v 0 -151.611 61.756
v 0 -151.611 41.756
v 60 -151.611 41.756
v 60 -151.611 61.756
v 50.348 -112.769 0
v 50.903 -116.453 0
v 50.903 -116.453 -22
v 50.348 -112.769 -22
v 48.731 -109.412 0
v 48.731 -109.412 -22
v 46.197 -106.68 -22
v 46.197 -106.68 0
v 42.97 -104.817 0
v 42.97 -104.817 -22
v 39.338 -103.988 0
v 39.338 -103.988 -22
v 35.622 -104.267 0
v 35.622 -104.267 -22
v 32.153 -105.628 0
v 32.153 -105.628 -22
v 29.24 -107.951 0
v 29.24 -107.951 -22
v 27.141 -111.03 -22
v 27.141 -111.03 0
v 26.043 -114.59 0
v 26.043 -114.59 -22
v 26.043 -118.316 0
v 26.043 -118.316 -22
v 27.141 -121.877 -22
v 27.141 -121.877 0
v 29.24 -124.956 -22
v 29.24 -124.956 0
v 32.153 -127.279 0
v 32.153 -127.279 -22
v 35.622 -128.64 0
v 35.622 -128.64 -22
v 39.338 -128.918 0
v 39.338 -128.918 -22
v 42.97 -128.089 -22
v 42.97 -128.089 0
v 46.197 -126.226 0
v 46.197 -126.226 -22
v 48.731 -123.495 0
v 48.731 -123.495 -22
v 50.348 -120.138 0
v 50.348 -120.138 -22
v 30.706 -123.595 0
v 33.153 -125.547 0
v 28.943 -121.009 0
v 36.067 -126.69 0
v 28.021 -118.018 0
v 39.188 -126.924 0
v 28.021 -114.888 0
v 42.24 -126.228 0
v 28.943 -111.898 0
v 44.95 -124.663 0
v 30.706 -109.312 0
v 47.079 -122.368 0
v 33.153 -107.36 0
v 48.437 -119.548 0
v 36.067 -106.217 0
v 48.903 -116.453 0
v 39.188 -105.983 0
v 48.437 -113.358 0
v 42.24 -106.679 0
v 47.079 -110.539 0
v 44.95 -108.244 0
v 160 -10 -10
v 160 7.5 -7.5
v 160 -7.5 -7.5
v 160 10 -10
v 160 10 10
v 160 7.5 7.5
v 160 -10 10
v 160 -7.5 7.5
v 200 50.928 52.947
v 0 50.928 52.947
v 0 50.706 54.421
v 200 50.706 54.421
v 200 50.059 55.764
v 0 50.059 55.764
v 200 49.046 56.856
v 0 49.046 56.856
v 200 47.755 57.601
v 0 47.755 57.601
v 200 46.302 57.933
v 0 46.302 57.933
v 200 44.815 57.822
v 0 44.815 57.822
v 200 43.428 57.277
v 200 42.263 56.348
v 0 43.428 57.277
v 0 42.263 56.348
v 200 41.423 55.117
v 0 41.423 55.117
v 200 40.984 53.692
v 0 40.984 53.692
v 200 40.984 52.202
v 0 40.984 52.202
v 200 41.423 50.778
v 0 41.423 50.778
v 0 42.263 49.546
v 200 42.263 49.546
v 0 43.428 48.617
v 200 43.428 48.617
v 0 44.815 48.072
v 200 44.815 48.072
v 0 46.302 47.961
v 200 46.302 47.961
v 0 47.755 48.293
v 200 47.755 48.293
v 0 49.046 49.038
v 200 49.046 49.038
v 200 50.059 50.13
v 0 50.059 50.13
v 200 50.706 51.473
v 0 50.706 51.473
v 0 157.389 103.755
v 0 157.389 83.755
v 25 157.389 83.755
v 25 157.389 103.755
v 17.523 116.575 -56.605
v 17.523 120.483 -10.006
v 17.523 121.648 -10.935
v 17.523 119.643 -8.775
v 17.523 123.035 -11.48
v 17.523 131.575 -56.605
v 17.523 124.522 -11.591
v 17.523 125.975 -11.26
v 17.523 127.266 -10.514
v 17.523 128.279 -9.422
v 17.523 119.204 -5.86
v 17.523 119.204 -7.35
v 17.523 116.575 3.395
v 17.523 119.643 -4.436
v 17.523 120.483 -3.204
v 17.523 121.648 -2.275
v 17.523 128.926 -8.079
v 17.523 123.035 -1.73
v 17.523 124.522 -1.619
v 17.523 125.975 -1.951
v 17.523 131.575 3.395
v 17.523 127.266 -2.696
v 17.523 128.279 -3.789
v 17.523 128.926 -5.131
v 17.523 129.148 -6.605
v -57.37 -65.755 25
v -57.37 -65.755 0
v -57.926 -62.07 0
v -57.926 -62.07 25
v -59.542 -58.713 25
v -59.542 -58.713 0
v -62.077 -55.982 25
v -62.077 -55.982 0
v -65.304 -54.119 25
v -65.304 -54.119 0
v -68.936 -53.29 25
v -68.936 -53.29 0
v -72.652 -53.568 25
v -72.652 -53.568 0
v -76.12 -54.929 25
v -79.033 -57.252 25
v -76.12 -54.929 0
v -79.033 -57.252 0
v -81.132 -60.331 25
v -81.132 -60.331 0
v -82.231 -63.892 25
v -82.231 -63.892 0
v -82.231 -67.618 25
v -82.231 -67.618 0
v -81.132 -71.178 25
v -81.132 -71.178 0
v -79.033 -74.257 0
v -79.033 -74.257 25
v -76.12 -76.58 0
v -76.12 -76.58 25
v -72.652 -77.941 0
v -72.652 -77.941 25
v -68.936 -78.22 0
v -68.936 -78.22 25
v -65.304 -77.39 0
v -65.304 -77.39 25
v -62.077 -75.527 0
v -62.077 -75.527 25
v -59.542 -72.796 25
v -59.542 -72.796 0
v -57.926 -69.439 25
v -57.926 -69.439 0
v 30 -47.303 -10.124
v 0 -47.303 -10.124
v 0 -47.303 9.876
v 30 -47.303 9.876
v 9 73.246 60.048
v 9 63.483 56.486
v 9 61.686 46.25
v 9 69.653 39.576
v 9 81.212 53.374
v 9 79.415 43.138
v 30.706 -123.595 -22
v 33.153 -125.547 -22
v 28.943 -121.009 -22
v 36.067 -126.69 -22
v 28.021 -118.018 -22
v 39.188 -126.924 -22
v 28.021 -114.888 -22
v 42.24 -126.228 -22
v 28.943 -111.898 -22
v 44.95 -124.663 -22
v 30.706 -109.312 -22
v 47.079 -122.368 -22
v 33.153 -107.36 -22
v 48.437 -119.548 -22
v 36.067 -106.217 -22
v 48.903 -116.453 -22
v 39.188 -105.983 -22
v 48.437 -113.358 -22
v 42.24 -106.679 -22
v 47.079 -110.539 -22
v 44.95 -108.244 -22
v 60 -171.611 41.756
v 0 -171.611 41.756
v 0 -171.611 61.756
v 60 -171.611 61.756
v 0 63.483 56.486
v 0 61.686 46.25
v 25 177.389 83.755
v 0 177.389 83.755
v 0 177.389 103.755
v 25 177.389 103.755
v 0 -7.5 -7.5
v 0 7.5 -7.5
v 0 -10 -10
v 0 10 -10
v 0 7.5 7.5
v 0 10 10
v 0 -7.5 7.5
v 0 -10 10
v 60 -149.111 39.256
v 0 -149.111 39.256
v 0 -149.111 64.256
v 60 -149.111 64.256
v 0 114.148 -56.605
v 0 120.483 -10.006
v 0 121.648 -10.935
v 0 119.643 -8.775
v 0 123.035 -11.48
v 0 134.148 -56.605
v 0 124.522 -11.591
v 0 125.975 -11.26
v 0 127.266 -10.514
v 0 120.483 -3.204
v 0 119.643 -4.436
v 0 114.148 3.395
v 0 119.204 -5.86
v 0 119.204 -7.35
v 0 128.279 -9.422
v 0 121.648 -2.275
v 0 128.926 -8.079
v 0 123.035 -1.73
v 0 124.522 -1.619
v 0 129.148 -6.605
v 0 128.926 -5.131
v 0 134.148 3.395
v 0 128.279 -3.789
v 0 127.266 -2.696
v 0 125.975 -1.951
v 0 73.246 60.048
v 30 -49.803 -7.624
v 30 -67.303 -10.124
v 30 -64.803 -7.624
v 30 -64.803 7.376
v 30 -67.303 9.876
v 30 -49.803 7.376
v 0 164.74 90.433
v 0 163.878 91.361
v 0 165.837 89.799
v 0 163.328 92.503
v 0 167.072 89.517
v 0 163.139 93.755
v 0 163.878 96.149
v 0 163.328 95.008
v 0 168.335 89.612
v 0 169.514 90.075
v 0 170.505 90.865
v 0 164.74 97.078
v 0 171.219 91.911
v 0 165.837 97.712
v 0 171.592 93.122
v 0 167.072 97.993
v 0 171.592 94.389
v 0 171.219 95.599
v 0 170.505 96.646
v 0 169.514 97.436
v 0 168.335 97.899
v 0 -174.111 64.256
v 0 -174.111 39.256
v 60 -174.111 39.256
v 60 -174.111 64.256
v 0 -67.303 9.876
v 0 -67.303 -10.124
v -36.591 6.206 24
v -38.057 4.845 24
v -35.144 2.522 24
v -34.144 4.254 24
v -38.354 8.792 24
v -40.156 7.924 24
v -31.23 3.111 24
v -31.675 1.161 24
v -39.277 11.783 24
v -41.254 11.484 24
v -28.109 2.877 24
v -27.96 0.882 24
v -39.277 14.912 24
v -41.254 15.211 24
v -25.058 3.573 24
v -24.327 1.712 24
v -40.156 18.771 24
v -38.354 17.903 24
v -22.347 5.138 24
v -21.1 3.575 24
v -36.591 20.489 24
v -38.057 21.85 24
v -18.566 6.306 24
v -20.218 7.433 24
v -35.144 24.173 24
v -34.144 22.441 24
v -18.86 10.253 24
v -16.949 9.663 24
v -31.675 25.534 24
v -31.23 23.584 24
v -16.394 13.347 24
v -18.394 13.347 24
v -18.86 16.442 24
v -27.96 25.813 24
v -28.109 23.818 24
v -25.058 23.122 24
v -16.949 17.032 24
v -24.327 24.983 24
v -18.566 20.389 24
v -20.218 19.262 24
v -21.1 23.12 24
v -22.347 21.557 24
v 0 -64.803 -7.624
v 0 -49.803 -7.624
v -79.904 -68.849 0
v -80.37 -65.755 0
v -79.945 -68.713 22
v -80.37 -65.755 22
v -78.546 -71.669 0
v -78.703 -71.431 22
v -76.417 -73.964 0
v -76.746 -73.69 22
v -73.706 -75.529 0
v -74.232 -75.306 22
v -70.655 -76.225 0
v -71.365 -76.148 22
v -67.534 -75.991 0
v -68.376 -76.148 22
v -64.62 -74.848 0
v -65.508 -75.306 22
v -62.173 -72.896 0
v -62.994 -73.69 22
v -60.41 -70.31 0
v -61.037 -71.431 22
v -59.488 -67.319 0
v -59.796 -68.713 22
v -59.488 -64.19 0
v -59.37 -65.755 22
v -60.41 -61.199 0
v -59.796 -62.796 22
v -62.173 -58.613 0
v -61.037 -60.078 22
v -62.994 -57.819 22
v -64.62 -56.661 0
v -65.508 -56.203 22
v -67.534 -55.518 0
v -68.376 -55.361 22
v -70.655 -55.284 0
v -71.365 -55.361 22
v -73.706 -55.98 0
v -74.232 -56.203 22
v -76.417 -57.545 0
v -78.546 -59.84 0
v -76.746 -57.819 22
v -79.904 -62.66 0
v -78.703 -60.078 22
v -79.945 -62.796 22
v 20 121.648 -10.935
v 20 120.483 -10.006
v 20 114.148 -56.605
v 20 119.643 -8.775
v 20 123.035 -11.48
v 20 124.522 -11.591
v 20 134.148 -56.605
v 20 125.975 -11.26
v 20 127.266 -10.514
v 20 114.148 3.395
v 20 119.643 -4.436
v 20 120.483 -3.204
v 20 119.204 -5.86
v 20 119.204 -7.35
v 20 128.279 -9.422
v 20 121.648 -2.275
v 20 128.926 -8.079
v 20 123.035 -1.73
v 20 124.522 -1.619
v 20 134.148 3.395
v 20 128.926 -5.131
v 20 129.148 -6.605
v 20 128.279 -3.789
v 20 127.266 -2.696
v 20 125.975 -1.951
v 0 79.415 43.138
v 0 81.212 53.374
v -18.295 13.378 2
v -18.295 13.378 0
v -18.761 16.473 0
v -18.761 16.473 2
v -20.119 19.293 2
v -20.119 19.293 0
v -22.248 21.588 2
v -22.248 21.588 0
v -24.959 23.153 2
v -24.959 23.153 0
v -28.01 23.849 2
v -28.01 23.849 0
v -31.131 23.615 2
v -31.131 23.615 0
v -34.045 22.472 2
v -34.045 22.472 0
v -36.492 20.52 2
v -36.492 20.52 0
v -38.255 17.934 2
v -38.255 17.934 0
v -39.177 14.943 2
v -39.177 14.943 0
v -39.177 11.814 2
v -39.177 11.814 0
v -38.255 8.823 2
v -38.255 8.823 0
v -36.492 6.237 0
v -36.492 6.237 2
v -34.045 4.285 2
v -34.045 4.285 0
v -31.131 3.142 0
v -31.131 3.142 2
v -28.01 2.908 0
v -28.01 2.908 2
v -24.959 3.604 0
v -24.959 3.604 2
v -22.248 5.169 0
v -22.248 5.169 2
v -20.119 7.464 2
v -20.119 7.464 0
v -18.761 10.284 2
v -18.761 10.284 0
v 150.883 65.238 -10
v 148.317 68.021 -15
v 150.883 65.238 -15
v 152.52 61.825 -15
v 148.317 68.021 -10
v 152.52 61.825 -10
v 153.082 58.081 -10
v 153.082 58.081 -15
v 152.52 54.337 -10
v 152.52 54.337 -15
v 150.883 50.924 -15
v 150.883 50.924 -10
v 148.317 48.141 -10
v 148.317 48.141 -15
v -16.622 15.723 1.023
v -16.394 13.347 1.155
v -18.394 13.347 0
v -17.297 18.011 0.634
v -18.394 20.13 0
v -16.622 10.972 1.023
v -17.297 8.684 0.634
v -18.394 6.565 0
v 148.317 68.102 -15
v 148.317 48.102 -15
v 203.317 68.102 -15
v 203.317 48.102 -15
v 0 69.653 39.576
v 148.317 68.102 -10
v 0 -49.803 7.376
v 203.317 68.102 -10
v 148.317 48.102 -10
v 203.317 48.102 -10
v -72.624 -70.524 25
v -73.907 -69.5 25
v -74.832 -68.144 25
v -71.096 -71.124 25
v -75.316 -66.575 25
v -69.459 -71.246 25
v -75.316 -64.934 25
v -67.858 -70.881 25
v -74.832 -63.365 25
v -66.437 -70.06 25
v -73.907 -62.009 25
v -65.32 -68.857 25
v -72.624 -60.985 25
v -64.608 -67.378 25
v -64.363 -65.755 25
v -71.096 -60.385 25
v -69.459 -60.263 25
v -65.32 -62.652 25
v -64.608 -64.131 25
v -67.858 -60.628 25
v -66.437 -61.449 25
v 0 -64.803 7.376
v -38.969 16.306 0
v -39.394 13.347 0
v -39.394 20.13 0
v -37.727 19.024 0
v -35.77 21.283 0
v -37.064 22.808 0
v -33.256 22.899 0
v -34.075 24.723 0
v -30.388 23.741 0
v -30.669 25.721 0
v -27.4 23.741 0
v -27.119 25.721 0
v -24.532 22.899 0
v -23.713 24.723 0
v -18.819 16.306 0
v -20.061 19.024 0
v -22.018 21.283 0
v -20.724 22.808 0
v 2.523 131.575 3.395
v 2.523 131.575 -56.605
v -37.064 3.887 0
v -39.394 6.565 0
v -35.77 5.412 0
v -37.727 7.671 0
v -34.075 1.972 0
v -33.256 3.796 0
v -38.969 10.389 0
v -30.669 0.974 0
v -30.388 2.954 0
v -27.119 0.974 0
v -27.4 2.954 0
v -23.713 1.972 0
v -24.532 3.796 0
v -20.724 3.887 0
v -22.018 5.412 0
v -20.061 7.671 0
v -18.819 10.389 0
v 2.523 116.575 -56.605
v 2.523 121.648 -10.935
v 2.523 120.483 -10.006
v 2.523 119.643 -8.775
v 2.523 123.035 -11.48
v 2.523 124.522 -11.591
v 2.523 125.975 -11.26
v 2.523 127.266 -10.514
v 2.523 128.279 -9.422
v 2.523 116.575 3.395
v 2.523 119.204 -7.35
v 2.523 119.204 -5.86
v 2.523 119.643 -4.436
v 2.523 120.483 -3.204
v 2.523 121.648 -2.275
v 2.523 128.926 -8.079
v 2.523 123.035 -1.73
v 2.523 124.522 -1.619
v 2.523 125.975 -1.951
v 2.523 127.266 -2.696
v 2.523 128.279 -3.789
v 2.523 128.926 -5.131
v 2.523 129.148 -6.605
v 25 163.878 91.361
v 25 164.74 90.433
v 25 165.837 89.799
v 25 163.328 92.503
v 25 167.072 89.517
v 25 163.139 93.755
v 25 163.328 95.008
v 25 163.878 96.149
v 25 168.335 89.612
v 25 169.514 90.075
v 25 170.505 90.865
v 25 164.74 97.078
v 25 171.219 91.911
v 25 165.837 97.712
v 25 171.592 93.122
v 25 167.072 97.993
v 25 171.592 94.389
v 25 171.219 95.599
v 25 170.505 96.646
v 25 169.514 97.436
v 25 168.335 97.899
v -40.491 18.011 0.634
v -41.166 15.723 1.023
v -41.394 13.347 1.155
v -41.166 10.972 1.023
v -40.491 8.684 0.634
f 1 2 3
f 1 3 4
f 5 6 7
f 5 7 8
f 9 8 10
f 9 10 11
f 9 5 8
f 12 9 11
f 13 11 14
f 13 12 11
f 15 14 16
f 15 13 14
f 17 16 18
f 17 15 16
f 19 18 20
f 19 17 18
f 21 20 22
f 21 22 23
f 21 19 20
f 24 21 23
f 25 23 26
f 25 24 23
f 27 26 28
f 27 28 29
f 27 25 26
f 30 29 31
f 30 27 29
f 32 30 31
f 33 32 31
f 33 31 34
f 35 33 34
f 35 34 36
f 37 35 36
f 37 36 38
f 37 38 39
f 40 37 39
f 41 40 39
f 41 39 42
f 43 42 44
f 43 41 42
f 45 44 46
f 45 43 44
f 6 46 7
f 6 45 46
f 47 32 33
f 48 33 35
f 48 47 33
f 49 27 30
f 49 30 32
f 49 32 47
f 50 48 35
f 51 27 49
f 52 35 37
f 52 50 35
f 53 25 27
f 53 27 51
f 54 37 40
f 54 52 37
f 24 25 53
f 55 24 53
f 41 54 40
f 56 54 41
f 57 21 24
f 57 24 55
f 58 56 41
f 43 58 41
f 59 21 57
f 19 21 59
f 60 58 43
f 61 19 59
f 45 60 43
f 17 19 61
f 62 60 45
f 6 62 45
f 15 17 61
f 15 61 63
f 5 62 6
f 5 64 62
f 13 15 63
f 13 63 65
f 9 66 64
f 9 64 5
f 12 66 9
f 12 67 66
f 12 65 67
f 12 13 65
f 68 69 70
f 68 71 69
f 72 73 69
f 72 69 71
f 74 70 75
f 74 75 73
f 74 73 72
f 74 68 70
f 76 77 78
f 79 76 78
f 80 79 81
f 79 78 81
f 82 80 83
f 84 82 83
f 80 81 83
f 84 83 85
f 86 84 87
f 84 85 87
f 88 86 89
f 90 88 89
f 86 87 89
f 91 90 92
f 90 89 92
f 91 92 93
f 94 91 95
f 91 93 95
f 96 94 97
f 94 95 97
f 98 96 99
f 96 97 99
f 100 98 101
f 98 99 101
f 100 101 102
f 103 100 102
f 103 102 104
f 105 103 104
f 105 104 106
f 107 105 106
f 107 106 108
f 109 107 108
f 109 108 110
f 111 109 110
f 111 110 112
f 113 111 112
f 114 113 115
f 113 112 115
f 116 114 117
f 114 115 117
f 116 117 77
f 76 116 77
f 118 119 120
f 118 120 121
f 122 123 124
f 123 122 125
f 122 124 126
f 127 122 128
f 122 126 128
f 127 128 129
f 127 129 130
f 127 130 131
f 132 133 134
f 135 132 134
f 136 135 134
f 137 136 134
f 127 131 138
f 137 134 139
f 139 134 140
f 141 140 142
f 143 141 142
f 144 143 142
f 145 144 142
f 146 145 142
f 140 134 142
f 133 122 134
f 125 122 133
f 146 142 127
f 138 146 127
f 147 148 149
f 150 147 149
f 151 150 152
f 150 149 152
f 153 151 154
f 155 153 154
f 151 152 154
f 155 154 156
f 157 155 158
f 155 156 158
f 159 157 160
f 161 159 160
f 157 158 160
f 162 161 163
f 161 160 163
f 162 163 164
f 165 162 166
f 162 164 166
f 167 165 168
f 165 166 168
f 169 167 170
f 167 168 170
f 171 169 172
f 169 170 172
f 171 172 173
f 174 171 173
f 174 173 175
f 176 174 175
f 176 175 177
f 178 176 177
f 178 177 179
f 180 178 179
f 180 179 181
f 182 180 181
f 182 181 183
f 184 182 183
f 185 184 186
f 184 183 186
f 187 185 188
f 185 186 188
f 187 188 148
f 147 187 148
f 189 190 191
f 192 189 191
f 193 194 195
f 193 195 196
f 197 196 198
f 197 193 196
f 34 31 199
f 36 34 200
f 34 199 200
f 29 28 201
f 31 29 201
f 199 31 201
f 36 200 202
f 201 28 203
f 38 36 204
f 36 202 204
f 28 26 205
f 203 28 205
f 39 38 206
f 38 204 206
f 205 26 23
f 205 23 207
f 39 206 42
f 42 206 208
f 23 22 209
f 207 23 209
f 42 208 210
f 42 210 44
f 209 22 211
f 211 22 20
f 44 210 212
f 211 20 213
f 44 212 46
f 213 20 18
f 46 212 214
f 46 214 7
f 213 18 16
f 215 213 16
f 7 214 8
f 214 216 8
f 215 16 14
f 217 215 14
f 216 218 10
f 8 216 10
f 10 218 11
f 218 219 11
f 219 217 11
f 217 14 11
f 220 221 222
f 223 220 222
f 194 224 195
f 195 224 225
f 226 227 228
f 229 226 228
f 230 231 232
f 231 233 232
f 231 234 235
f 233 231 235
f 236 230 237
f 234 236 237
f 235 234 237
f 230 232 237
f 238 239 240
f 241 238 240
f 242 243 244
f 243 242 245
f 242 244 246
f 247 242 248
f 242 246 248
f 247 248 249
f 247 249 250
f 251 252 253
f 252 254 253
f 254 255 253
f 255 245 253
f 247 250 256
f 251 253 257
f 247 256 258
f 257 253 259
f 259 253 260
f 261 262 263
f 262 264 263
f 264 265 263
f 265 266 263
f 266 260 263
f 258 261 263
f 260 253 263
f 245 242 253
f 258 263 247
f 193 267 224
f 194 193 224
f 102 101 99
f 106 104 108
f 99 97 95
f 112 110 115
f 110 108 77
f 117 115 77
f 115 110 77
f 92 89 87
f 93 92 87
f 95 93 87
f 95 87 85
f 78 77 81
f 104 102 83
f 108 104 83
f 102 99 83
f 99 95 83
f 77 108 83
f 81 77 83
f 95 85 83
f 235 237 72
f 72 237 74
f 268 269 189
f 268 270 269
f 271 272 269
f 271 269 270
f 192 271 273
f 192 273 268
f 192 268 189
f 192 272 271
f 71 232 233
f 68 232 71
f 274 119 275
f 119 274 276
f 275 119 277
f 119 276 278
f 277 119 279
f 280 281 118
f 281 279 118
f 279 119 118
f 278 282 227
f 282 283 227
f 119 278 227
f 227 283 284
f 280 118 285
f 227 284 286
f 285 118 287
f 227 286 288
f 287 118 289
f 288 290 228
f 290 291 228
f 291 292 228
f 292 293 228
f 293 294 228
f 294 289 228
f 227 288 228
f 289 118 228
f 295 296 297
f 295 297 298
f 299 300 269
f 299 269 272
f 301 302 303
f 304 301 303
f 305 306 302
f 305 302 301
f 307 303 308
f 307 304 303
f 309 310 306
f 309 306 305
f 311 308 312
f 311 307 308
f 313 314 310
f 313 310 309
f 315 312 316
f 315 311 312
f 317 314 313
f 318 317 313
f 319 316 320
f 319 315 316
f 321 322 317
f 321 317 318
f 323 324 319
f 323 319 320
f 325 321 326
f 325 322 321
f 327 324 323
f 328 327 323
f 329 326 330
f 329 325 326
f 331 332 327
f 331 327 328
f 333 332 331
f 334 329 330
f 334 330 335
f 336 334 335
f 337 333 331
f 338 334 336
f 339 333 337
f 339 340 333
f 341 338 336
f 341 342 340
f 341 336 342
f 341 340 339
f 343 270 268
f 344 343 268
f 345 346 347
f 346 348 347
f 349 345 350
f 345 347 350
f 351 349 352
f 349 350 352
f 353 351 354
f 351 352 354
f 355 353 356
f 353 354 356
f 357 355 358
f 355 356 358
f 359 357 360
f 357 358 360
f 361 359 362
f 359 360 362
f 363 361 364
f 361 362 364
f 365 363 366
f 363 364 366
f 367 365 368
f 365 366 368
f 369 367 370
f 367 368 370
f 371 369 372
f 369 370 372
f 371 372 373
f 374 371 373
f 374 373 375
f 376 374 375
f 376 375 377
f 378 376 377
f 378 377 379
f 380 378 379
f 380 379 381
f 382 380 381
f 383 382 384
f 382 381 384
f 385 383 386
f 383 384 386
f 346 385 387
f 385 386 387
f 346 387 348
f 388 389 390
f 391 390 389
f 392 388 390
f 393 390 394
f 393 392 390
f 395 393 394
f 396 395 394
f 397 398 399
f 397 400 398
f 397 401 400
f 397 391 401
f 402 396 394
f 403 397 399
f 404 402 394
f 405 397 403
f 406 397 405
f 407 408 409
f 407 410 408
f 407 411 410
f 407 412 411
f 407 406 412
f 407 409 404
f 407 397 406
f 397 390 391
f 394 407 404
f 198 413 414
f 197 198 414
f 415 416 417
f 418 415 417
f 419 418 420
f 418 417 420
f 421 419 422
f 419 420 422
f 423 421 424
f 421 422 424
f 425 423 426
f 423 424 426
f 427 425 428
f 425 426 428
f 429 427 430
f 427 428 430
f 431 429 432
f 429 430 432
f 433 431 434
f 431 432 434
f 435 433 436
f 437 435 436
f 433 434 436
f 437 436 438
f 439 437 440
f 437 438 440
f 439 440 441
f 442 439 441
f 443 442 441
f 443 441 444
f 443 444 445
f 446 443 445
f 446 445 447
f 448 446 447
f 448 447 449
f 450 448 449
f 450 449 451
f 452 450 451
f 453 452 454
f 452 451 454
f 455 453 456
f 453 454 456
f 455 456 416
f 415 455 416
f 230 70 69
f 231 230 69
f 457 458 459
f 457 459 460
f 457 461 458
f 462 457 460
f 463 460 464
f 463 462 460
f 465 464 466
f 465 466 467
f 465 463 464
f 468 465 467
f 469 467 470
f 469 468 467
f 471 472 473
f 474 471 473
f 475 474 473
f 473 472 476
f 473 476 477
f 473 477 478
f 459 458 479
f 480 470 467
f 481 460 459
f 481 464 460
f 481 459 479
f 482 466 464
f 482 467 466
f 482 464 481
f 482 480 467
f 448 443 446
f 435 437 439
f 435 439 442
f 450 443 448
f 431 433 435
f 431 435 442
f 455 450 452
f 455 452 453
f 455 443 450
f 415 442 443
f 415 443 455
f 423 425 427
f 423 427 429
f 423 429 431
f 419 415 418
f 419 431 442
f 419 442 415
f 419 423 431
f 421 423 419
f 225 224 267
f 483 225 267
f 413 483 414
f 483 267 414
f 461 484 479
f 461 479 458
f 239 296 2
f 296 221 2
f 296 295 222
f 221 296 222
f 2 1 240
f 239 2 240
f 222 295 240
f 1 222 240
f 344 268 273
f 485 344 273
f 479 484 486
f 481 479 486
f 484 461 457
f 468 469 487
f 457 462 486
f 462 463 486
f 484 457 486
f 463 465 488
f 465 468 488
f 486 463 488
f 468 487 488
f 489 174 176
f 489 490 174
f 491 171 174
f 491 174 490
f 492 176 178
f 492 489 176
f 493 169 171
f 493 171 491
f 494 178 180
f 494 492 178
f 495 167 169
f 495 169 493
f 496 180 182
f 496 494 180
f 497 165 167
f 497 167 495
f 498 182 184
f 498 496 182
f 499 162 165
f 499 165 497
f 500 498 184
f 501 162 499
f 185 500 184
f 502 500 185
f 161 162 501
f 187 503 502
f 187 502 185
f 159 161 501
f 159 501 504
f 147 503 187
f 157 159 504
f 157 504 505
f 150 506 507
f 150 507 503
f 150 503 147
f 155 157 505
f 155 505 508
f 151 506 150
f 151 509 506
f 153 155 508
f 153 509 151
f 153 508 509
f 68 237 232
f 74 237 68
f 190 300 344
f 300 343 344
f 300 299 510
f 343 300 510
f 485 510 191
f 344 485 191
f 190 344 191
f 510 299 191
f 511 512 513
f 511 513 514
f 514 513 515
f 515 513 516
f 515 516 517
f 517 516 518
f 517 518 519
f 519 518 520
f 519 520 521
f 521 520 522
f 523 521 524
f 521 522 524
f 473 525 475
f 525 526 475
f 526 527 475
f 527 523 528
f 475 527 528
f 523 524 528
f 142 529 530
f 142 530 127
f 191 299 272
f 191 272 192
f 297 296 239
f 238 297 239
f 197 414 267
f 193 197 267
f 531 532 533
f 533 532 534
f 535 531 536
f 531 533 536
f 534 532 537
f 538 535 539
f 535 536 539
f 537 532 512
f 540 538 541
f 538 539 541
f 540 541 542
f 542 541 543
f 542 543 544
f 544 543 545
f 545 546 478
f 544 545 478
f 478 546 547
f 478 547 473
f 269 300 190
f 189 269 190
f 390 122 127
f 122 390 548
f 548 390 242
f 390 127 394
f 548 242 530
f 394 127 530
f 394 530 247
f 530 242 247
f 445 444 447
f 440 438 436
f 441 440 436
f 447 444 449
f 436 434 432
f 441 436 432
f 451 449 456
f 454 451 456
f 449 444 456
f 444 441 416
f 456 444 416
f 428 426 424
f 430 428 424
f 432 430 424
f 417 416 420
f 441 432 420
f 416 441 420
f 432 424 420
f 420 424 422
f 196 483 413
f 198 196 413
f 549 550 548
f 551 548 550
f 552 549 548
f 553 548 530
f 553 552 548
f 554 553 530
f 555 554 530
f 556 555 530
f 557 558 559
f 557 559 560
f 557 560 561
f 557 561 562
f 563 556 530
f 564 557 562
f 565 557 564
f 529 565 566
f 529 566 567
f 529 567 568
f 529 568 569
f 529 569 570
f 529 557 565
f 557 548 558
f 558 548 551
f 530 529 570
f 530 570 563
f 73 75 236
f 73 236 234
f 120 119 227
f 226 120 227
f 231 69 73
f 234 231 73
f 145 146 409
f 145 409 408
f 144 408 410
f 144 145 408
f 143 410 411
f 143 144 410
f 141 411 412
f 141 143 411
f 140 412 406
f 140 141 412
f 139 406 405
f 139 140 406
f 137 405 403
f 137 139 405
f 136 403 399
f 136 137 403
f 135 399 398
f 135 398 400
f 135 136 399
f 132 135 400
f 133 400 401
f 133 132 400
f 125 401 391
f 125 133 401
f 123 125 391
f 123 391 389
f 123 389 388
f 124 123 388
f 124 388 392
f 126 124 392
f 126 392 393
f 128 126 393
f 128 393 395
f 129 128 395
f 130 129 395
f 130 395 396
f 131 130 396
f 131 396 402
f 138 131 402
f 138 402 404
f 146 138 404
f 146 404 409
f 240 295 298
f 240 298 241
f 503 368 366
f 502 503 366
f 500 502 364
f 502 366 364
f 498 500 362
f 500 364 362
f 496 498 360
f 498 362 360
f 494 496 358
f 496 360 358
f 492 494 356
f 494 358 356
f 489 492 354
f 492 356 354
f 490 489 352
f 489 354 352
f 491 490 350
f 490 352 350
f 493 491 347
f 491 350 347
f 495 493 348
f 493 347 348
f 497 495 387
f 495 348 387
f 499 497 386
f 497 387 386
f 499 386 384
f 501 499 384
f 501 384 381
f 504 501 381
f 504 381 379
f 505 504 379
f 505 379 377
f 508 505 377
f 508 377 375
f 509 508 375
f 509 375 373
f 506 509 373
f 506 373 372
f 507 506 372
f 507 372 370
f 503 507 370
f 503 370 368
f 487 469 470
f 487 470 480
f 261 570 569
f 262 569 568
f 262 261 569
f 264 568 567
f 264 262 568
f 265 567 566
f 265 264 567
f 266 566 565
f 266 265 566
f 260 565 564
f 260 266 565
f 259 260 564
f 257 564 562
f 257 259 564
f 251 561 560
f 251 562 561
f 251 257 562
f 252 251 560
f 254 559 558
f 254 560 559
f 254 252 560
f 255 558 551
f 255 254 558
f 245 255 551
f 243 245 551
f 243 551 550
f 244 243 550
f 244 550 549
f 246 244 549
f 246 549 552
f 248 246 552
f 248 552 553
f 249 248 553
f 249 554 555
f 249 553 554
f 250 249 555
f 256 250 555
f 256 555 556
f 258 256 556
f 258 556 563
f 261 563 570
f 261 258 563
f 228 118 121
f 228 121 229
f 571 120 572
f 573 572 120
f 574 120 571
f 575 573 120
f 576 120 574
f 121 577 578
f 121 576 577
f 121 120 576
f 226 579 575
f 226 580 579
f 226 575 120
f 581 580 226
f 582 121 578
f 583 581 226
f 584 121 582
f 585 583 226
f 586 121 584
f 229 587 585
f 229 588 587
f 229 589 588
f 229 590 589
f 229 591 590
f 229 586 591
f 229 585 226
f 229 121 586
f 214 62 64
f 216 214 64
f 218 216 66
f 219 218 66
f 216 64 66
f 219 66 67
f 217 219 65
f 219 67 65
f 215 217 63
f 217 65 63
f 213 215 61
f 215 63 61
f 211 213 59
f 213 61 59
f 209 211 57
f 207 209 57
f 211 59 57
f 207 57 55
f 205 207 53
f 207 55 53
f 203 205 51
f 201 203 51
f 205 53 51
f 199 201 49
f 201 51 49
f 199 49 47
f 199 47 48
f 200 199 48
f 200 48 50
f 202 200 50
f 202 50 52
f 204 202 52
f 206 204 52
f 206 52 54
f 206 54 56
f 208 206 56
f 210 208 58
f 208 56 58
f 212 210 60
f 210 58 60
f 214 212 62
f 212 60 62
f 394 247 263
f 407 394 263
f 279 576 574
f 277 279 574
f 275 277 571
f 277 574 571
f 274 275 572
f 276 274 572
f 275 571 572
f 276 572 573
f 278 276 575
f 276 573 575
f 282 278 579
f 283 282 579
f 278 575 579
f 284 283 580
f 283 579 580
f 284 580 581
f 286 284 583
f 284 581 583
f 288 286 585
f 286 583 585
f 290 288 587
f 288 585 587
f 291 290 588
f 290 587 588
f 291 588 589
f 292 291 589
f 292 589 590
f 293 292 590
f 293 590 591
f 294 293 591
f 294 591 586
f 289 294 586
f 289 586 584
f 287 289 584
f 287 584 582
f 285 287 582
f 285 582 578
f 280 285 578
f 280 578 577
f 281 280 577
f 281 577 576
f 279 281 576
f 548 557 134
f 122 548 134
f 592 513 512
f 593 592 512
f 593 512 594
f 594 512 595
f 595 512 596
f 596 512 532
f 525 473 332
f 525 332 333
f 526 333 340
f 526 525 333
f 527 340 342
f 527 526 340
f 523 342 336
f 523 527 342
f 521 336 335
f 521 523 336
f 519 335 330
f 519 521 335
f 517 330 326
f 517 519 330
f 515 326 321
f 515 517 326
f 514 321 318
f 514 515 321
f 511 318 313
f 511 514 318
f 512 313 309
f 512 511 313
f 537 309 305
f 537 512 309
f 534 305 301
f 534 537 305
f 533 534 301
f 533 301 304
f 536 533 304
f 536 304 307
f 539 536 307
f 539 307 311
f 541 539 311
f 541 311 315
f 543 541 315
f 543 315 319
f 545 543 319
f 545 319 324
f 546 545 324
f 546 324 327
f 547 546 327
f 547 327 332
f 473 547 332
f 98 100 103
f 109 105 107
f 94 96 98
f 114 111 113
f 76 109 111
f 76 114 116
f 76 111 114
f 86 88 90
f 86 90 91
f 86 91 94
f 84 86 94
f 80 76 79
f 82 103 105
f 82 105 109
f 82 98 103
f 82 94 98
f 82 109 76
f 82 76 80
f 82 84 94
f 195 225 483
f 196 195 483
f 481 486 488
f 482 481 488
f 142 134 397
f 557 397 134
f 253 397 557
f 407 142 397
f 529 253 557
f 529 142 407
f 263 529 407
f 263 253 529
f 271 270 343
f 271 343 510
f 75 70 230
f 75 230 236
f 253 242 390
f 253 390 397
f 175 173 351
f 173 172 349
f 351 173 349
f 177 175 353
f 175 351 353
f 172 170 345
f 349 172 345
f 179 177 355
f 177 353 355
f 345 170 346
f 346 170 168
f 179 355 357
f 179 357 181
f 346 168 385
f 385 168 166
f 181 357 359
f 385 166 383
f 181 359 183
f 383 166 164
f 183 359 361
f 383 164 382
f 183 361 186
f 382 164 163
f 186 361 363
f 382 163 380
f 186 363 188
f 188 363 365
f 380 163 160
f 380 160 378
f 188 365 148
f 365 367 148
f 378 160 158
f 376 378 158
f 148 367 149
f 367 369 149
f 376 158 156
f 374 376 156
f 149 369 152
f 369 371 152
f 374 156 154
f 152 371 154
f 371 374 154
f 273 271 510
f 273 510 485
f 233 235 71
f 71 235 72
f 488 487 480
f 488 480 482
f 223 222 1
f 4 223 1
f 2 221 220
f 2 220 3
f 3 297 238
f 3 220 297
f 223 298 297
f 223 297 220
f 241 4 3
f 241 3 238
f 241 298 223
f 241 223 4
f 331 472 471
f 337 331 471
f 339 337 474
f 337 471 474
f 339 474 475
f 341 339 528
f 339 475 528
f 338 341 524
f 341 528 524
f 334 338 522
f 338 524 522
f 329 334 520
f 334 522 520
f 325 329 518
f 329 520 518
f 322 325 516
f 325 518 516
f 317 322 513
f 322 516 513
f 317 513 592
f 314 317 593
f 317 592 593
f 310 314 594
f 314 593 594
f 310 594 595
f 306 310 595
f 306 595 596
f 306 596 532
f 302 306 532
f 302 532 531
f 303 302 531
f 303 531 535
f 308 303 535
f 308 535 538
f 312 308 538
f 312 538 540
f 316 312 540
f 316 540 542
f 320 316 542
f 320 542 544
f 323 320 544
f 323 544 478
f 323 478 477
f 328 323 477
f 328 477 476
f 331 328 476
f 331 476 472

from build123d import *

# Parameters (mm, degrees)
F0_W      = 160
F0_H      = 20
F1_DEPTH  = 10
F2_W      = 25
F2_H      = 25
F2_W_2    = 20
F2_H_2    = 20
F3_DEPTH  = 60
F4_W      = 15
F4_H      = 15
F5_DEPTH  = 160
F6_W      = 20
F6_H      = 20
F6_W_2    = 15
F6_H_2    = 15
F7_DEPTH  = 30
F8_R      = 12.5
F8_R_2    = 10.5
F9_DEPTH  = 22
F10_R     = 12.5
F10_R_2   = 10.5
F11_DEPTH = 24
F12_R     = 12.5
F13_DEPTH = 25
F14_D     = 21
F14_DEPTH = 22
F14_TIP   = 6.3090364998
F15_W     = 55
F15_H     = 20
F16_DEPTH = 5
F17_W     = 20
F17_H     = 60
F17_R     = 5
F18_DEPTH = 20
F19_W     = 20
F19_H     = 20
F20_DEPTH = 25
F21_D     = 8.5
F22_R     = 5
F23_DEPTH = 200
F25_DEPTH = 9
F27_DEPTH = 25
F29_DEPTH = 25
F30_R     = 10.5
F31_DEPTH = 2
F32_W     = 15
F32_H     = 15
F33_DEPTH = 60
F34_R     = 12.75
F35_DEPTH = 5


# Not quite as in the source:
# - a feature names something its author has since deleted; it is built from what else it names


with BuildPart() as f1:
    # F0 (on Front) → F1 (new body, symmetric)
    with BuildSketch(Plane.XZ):
        with Locations((80, 0)):
            Rectangle(F0_W, F0_H)
    extrude(amount=F1_DEPTH, both=True)

    # F4 (on Right) → F5 (cut)
    with BuildSketch(Plane.YZ):
        Rectangle(F4_W, F4_H)
    extrude(amount=F5_DEPTH, mode=Mode.SUBTRACT)


with BuildPart() as f3:
    # F2 (on Right) → F3 (new body)
    with BuildSketch(Plane.YZ):
        with Locations((-161.6110950708, 51.756149815)):
            Rectangle(F2_W, F2_H)
        with Locations((-161.6110950708, 51.756149815)):
            Rectangle(F2_W_2, F2_H_2, mode=Mode.SUBTRACT)
    extrude(amount=F3_DEPTH)


with BuildPart() as f7:
    # F6 (on Right) → F7 (new body)
    with BuildSketch(Plane.YZ):
        with Locations((-57.3030114174, -0.1235169003)):
            Rectangle(F6_W, F6_H)
        with Locations((-57.3030114174, -0.1235169003)):
            Rectangle(F6_W_2, F6_H_2, mode=Mode.SUBTRACT)
    extrude(amount=F7_DEPTH)


with BuildPart() as f9:
    # F8 (on Top) → F9 (new body)
    with BuildSketch(Plane.XY):
        with Locations((38.4034886956, -116.4533868432)):
            Circle(F8_R)
        with Locations((38.4034886956, -116.4533868432)):
            Circle(F8_R_2, mode=Mode.SUBTRACT)
    extrude(amount=-F9_DEPTH)


with BuildPart() as f11:
    # F10 (on Top) → F11 (new body)
    with BuildSketch(Plane.XY):
        with Locations((-28.8939643651, 13.3474841714)):
            Circle(F10_R)
        with Locations((-28.8939643651, 13.3474841714)):
            Circle(F10_R_2, mode=Mode.SUBTRACT)
    extrude(amount=F11_DEPTH)

    # F26 (on Front) → F27 (cut)
    with BuildSketch(Plane.XZ):
        Polygon((-18.3939643651, 0), (-16.3939643651, 0), (-16.3939643651, 1.1547005384), align=None)
    extrude(amount=-F27_DEPTH, mode=Mode.SUBTRACT)

    # F28 (on Front) → F29 (cut)
    with BuildSketch(Plane.XZ):
        Polygon((-41.3939643651, 1.1547005384), (-41.3939643651, 0), (-39.3939643651, 0), align=None)
    extrude(amount=-F29_DEPTH, mode=Mode.SUBTRACT)


with BuildPart() as f13:
    # F12 (on Top) → F13 (new body)
    with BuildSketch(Plane.XY):
        with Locations((-69.8703065715, -65.7545542214)):
            Circle(F12_R)
    extrude(amount=F13_DEPTH)

    # F14
    with Locations(Plane(origin=(0, 0, 0), x_dir=(1, 0, 0), z_dir=(0, 0, -1))):
        with Locations((-69.8703065715, 65.7545542214)):
            Hole(F14_D / 2, depth=F14_DEPTH)
            with Locations((0, 0, -(F14_DEPTH + F14_TIP / 2))):  # 118° drill point
                Cone(0, F14_D / 2, F14_TIP, mode=Mode.SUBTRACT)


with BuildPart() as f16:
    # F15 (on face) → F16 (new body)
    with BuildSketch(Plane(origin=(0, 0, -10), x_dir=(1, 0, 0), z_dir=(0, 0, -1))):
        with Locations((175.8168041706, -58.102128388)):
            Rectangle(F15_W, F15_H)
    extrude(amount=F16_DEPTH)

    # F34 (on face) → F35 (cut)
    with BuildSketch(Plane(origin=(0, 0, -10), x_dir=(1, 0, 0), z_dir=(0, 0, -1))):
        with Locations((140.3318259962, -58.0808729371)):
            Circle(F34_R)
    extrude(amount=F35_DEPTH, mode=Mode.SUBTRACT)


with BuildPart() as f18:
    # F17 (on Right) → F18 (new body)
    with BuildSketch(Plane.YZ):
        with Locations((124.1480589582, -26.6051380336)):
            Rectangle(F17_W, F17_H)
        with Locations((124.1480589582, -6.6051380336)):
            Circle(F17_R, mode=Mode.SUBTRACT)
    extrude(amount=F18_DEPTH)

    # F32 (on face) → F33 (cut)
    with BuildSketch(Plane.XY.offset(3.3948619664)):
        with Locations((10.0230817938, 124.0749582648)):
            Rectangle(F32_W, F32_H)
    extrude(amount=-F33_DEPTH, mode=Mode.SUBTRACT)


with BuildPart() as f20:
    # F19 (on Right) → F20 (new body)
    with BuildSketch(Plane.YZ):
        with Locations((167.3894077539, 93.7553744961)):
            Rectangle(F19_W, F19_H)
    extrude(amount=F20_DEPTH)

    # F21 (through all)
    with Locations(Plane(origin=(0, 0, 0), x_dir=(0, 1, 0), z_dir=(-1, 0, 0))):
        with Locations((167.3894077539, -93.7553744961)):
            Hole(F21_D / 2)


with BuildPart() as f23:
    # F22 (on Right) → F23 (new body)
    with BuildSketch(Plane.YZ):
        with Locations((45.9281019866, 52.9470965266)):
            Circle(F22_R)
    extrude(amount=F23_DEPTH)


with BuildPart() as f25:
    # F24 (on Right) → F25 (new body)
    with BuildSketch(Plane.YZ):
        Polygon((79.4154354066, 43.138094305), (81.2119157193, 53.3739459299), (73.2456483392, 60.0476693305), (63.4829006463, 56.4855411063), (61.6864203336, 46.2496894814), (69.6526877137, 39.5759660808), align=None)
    extrude(amount=F25_DEPTH)


with BuildPart() as f31:
    # F30 (on Top) → F31 (new body)
    with BuildSketch(Plane.XY):
        with Locations((-28.7946469224, 13.378466991)):
            Circle(F30_R)
    extrude(amount=F31_DEPTH)


solid = Compound([f1.part, f3.part, f7.part, f9.part, f11.part, f13.part, f16.part, f18.part, f20.part, f23.part, f25.part, f31.part])
